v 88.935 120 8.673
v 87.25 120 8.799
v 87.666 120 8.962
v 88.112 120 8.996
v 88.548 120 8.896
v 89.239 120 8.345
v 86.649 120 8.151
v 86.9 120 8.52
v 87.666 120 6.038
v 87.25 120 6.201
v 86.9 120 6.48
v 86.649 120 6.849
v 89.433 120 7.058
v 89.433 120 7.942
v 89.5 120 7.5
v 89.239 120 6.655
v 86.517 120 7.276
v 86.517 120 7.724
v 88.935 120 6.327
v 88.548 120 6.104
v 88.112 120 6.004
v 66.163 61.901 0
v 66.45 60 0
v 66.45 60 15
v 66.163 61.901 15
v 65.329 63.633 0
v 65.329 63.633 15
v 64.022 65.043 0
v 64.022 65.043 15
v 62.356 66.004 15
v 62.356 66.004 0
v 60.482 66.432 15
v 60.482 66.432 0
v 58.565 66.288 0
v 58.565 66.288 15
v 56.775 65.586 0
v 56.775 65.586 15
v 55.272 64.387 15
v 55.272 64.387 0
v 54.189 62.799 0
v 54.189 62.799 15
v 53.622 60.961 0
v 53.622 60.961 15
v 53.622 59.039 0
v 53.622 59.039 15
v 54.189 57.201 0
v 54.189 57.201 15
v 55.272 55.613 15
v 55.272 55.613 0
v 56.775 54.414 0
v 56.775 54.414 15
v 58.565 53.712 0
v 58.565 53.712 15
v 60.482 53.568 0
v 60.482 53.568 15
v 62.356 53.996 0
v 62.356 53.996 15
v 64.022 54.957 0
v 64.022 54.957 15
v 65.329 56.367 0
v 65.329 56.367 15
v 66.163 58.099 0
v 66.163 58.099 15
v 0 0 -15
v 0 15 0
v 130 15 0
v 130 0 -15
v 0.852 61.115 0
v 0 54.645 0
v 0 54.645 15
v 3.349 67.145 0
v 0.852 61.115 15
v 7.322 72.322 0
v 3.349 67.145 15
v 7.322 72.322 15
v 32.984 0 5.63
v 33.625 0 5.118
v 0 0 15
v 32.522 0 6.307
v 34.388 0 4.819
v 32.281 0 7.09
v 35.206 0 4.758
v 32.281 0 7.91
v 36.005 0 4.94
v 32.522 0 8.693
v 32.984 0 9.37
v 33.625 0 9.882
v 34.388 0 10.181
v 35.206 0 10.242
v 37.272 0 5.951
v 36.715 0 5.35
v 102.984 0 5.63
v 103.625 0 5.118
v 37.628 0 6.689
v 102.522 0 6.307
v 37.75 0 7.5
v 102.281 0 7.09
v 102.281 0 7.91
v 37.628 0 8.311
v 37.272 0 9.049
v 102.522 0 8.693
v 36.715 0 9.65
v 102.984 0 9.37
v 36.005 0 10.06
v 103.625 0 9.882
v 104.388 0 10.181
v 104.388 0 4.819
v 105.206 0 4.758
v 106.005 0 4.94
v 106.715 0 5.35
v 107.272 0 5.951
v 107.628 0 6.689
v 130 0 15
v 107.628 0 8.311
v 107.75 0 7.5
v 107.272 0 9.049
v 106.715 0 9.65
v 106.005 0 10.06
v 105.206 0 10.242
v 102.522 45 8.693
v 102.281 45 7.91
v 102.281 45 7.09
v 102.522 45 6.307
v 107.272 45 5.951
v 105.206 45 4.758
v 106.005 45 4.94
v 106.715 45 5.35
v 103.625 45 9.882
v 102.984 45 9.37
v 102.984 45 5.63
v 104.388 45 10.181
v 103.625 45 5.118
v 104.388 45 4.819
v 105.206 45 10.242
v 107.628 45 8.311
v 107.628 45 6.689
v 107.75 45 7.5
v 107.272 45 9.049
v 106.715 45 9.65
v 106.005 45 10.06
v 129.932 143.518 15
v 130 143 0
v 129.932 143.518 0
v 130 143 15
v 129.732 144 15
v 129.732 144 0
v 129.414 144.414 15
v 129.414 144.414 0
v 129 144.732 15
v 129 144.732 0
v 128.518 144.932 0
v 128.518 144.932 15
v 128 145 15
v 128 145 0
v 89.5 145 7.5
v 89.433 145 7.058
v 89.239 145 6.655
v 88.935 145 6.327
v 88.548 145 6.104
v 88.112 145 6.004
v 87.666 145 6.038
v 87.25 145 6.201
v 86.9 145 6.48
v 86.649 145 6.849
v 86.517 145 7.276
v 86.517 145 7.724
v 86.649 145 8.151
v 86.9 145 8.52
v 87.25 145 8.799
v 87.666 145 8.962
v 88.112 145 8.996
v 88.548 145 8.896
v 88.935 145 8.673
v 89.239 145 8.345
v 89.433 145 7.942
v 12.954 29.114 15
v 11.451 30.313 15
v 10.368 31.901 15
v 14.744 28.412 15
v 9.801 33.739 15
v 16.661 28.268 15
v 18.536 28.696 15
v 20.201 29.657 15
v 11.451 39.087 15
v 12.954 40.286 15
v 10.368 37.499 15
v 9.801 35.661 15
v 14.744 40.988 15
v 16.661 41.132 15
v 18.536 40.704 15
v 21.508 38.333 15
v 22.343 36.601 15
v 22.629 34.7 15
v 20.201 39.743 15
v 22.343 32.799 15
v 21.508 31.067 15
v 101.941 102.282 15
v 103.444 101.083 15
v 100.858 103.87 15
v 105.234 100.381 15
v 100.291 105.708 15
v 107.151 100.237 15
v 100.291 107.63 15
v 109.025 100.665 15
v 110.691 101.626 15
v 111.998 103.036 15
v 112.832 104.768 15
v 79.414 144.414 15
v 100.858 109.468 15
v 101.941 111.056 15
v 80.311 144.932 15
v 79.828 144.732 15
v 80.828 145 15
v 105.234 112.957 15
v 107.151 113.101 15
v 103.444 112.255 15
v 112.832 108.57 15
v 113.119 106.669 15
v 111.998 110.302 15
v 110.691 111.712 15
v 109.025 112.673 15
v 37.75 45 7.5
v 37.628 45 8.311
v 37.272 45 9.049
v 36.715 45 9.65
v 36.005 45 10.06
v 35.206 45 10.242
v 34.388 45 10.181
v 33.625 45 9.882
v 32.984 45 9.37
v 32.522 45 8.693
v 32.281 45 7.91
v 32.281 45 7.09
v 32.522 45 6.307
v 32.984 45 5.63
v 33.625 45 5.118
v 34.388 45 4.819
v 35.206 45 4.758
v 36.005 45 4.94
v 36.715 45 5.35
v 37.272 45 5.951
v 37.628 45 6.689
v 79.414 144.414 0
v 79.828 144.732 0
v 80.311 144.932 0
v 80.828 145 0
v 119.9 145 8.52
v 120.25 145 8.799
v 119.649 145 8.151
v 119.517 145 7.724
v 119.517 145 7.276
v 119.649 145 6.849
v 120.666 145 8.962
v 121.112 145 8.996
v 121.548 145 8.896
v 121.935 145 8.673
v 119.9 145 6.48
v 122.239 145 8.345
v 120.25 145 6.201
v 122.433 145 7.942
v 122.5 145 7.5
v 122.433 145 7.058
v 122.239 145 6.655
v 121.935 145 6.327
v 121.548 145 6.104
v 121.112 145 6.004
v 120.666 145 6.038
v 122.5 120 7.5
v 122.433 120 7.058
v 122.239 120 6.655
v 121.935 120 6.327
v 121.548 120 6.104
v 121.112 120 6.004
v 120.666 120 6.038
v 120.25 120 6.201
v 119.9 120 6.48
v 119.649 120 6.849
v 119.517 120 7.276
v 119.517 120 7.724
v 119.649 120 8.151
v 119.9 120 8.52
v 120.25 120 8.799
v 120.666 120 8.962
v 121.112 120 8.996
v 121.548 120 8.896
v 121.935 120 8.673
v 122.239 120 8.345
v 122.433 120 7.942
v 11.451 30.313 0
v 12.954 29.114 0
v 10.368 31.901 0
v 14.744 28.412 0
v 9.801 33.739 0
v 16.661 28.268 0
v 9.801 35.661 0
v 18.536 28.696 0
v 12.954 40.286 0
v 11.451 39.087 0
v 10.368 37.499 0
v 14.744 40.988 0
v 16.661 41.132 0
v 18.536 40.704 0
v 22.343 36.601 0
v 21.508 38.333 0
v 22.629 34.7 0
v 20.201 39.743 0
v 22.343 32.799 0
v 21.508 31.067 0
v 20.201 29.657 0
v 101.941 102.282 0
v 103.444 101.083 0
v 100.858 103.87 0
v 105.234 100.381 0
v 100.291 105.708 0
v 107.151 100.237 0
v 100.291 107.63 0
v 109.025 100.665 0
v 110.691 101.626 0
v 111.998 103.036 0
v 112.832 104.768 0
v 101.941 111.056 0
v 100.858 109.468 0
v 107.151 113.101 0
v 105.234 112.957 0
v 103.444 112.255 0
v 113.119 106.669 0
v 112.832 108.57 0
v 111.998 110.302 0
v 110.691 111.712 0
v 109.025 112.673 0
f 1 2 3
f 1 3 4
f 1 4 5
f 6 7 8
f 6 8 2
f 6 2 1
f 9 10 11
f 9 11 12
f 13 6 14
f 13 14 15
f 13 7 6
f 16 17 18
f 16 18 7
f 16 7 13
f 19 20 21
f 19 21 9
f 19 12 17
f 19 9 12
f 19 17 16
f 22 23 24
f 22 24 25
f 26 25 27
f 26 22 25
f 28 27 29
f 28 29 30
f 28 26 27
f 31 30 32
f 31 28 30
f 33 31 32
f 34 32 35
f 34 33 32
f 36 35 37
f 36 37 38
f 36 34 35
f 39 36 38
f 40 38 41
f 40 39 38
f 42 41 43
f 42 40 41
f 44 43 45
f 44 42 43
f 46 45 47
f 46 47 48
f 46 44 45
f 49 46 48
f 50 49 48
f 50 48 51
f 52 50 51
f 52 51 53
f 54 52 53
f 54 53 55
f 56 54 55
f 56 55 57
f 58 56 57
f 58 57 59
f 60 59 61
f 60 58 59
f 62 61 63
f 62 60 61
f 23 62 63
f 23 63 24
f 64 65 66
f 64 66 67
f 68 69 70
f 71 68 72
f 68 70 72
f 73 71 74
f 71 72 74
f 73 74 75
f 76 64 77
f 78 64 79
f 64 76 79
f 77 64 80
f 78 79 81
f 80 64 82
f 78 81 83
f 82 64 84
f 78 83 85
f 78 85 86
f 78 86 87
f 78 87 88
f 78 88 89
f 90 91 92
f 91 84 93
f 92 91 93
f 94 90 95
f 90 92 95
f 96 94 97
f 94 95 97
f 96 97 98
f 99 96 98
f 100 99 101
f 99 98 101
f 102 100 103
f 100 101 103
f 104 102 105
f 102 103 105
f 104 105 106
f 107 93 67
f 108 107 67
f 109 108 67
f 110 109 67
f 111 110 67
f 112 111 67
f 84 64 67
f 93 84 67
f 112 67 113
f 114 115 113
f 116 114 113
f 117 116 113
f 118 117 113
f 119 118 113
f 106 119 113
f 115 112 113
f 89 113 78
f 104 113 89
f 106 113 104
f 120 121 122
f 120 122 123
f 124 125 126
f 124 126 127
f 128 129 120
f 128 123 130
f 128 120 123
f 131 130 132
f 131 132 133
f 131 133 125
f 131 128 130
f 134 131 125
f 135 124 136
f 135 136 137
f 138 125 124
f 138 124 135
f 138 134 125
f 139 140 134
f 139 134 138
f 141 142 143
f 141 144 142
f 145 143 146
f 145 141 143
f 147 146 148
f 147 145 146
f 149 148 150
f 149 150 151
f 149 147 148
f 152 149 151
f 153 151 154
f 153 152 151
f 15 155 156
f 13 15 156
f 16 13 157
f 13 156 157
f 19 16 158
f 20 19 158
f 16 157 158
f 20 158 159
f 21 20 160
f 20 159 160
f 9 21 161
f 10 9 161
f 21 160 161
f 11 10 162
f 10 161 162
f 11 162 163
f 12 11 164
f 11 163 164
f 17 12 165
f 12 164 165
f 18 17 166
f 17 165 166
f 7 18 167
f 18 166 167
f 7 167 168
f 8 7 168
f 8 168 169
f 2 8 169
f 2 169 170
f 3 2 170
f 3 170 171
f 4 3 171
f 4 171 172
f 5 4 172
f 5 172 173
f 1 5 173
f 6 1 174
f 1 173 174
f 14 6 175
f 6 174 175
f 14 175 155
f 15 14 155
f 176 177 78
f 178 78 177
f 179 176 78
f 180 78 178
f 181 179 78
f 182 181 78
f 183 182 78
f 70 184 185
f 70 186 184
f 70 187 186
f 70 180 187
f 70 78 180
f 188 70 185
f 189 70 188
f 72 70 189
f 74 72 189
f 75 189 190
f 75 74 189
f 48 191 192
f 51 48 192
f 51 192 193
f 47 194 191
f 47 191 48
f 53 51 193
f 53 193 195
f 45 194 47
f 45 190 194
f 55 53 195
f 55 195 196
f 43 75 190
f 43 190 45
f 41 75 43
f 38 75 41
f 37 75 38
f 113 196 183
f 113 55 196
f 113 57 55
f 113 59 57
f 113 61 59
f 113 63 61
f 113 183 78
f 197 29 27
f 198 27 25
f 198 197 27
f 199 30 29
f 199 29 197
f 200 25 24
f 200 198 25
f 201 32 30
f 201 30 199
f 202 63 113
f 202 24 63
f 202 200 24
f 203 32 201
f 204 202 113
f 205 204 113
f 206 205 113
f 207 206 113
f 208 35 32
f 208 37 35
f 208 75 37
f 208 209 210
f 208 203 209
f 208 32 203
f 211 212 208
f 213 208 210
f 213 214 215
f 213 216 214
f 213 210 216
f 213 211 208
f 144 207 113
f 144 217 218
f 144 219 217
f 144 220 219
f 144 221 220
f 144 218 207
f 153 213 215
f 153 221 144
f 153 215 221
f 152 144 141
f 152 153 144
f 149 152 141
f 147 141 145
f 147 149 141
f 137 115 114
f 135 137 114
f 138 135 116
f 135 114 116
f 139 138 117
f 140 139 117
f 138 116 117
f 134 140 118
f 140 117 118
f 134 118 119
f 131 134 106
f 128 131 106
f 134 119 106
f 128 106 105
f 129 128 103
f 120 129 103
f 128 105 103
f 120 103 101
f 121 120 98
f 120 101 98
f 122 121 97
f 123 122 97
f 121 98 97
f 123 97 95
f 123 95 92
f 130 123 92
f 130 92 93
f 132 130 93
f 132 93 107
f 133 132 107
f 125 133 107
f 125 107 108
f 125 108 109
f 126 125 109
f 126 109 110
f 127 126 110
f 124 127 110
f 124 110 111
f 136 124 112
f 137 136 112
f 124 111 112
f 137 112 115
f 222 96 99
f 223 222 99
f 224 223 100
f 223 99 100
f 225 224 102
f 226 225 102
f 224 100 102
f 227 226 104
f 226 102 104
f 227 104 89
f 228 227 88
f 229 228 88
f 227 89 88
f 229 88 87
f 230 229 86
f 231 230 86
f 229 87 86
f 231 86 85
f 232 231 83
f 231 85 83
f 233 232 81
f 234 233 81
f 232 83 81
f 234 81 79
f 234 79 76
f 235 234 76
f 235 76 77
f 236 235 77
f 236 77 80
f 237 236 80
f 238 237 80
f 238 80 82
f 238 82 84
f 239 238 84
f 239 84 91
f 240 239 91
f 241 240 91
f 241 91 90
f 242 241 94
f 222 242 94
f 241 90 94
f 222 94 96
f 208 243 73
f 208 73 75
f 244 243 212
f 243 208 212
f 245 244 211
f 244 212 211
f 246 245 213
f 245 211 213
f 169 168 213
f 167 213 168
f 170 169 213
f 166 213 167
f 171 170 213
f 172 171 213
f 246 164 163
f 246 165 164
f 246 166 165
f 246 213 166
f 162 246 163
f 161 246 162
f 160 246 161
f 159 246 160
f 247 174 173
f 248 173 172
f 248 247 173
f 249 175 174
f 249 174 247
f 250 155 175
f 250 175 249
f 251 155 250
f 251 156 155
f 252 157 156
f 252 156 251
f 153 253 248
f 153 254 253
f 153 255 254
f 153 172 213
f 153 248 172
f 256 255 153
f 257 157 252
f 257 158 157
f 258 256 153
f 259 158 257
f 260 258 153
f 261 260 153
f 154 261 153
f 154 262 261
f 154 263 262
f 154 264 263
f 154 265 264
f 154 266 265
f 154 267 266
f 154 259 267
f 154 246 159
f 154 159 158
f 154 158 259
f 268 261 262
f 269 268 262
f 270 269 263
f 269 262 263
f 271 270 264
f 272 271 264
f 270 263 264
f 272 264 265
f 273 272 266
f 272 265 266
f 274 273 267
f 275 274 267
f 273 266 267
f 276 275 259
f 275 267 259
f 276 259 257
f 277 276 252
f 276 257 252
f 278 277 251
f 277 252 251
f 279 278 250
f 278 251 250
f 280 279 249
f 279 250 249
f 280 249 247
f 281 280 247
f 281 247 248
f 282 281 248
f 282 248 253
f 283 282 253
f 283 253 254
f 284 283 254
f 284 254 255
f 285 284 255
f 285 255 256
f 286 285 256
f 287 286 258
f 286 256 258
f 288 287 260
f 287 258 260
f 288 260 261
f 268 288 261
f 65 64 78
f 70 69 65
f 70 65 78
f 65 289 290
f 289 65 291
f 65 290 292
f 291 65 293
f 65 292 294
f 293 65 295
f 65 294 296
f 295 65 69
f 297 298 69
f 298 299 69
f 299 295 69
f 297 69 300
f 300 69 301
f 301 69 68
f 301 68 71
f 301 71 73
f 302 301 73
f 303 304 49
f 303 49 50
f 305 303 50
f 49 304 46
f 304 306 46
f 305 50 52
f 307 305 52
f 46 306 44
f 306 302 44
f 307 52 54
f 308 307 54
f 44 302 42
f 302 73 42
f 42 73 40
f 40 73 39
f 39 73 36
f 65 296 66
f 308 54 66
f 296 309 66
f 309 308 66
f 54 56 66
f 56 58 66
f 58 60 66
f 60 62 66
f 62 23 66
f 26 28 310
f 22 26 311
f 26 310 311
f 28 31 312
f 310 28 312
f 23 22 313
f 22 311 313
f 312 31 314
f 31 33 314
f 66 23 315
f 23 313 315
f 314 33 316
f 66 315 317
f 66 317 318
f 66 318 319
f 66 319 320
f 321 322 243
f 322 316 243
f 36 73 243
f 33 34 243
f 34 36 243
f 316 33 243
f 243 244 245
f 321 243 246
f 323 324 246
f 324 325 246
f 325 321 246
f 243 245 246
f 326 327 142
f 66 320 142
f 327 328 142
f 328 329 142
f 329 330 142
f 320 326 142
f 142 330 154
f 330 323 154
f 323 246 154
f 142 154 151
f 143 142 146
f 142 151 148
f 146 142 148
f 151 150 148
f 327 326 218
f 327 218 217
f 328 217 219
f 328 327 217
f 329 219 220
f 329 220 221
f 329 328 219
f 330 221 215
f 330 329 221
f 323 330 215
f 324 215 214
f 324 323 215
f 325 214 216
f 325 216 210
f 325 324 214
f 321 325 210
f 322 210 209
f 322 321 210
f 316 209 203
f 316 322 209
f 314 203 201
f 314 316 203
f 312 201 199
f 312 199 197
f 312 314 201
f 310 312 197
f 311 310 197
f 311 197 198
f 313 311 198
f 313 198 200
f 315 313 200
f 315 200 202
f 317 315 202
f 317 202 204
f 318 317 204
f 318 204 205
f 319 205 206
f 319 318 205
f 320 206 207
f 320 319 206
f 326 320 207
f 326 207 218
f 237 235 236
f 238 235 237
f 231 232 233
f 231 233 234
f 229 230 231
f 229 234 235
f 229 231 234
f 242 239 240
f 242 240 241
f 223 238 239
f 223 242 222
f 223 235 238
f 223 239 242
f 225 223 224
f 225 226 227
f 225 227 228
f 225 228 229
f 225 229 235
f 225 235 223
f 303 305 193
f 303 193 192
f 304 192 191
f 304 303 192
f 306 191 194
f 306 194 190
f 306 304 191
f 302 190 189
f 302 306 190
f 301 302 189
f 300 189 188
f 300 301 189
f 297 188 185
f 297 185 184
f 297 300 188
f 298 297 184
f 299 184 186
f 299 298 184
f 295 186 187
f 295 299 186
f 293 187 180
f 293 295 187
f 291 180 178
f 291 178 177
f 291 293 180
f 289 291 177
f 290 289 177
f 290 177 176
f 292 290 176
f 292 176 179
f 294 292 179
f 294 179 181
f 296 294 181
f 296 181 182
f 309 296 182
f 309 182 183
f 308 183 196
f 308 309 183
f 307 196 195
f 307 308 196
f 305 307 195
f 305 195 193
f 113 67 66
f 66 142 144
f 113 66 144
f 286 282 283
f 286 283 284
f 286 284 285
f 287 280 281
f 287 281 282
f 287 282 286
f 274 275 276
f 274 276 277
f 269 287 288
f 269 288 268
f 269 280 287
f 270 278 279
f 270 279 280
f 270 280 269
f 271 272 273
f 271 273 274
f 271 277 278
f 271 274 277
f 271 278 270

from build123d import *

# Parameters (mm, degrees)
SKETCH1_W           = 130
SKETCH1_H           = 145
SKETCH1_R           = 6.45
BOSS_EXTRUDE1_DEPTH = 15
CHAMFER1_SIZE       = 80
FILLET2_R           = 25
FILLET1_R           = 2
BOSS_EXTRUDE2_DEPTH = 130
SKETCH3_R           = 2.75
CUT_EXTRUDE1_DEPTH  = 45
SKETCH4_R           = 1.5
CUT_EXTRUDE2_DEPTH  = 25


with BuildPart() as part:
    # Sketch1 → Boss-Extrude1 (new body)
    with BuildSketch(Plane.XY):
        with Locations((65, 72.5)):
            Rectangle(SKETCH1_W, SKETCH1_H)
        with Locations((60, 60)):
            Circle(SKETCH1_R, mode=Mode.SUBTRACT)
        with Locations((106.669047558, 106.669047558)):
            Circle(SKETCH1_R, mode=Mode.SUBTRACT)
        with Locations((16.179114569, 34.7)):
            Circle(SKETCH1_R, mode=Mode.SUBTRACT)
    extrude(amount=BOSS_EXTRUDE1_DEPTH)

    # Chamfer1
    chamfer1_edges = [part.edges().sort_by_distance(p)[0] for p in [
        (0, 145, 7.5),
    ]]
    chamfer(chamfer1_edges, length=CHAMFER1_SIZE)

    # Fillet2
    fillet2_edges = [part.edges().sort_by_distance(p)[0] for p in [
        (0, 65, 7.5),
    ]]
    fillet(fillet2_edges, radius=FILLET2_R)

    # Fillet1
    fillet1_edges = [part.edges().sort_by_distance(p)[0] for p in [
        (80, 145, 7.5),
        (130, 145, 7.5),
    ]]
    fillet(fillet1_edges, radius=FILLET1_R)

    # Sketch2 → Boss-Extrude2 (add, through all)
    with BuildSketch(Plane(origin=(130, 0, 0), x_dir=(0, 0, -1), z_dir=(1, 0, 0))):
        Polygon((0, 15), (15, 0), (0, 0), align=None)
    extrude(amount=-BOSS_EXTRUDE2_DEPTH)

    # Sketch3 → Cut-Extrude1 (cut)
    with BuildSketch(Plane.XZ):
        with Locations((35, 7.5)):
            Circle(SKETCH3_R)
        with Locations((105, 7.5)):
            Circle(SKETCH3_R)
    extrude(amount=-CUT_EXTRUDE1_DEPTH, mode=Mode.SUBTRACT)

    # Sketch4 → Cut-Extrude2 (cut)
    with BuildSketch(Plane(origin=(0, 145, 0), x_dir=(1, 0, 0), z_dir=(0, 1, 0))):
        with Locations((121, -7.5)):
            Circle(SKETCH4_R)
        with Locations((88, -7.5)):
            Circle(SKETCH4_R)
    extrude(amount=-CUT_EXTRUDE2_DEPTH, mode=Mode.SUBTRACT)


solid = part.part
